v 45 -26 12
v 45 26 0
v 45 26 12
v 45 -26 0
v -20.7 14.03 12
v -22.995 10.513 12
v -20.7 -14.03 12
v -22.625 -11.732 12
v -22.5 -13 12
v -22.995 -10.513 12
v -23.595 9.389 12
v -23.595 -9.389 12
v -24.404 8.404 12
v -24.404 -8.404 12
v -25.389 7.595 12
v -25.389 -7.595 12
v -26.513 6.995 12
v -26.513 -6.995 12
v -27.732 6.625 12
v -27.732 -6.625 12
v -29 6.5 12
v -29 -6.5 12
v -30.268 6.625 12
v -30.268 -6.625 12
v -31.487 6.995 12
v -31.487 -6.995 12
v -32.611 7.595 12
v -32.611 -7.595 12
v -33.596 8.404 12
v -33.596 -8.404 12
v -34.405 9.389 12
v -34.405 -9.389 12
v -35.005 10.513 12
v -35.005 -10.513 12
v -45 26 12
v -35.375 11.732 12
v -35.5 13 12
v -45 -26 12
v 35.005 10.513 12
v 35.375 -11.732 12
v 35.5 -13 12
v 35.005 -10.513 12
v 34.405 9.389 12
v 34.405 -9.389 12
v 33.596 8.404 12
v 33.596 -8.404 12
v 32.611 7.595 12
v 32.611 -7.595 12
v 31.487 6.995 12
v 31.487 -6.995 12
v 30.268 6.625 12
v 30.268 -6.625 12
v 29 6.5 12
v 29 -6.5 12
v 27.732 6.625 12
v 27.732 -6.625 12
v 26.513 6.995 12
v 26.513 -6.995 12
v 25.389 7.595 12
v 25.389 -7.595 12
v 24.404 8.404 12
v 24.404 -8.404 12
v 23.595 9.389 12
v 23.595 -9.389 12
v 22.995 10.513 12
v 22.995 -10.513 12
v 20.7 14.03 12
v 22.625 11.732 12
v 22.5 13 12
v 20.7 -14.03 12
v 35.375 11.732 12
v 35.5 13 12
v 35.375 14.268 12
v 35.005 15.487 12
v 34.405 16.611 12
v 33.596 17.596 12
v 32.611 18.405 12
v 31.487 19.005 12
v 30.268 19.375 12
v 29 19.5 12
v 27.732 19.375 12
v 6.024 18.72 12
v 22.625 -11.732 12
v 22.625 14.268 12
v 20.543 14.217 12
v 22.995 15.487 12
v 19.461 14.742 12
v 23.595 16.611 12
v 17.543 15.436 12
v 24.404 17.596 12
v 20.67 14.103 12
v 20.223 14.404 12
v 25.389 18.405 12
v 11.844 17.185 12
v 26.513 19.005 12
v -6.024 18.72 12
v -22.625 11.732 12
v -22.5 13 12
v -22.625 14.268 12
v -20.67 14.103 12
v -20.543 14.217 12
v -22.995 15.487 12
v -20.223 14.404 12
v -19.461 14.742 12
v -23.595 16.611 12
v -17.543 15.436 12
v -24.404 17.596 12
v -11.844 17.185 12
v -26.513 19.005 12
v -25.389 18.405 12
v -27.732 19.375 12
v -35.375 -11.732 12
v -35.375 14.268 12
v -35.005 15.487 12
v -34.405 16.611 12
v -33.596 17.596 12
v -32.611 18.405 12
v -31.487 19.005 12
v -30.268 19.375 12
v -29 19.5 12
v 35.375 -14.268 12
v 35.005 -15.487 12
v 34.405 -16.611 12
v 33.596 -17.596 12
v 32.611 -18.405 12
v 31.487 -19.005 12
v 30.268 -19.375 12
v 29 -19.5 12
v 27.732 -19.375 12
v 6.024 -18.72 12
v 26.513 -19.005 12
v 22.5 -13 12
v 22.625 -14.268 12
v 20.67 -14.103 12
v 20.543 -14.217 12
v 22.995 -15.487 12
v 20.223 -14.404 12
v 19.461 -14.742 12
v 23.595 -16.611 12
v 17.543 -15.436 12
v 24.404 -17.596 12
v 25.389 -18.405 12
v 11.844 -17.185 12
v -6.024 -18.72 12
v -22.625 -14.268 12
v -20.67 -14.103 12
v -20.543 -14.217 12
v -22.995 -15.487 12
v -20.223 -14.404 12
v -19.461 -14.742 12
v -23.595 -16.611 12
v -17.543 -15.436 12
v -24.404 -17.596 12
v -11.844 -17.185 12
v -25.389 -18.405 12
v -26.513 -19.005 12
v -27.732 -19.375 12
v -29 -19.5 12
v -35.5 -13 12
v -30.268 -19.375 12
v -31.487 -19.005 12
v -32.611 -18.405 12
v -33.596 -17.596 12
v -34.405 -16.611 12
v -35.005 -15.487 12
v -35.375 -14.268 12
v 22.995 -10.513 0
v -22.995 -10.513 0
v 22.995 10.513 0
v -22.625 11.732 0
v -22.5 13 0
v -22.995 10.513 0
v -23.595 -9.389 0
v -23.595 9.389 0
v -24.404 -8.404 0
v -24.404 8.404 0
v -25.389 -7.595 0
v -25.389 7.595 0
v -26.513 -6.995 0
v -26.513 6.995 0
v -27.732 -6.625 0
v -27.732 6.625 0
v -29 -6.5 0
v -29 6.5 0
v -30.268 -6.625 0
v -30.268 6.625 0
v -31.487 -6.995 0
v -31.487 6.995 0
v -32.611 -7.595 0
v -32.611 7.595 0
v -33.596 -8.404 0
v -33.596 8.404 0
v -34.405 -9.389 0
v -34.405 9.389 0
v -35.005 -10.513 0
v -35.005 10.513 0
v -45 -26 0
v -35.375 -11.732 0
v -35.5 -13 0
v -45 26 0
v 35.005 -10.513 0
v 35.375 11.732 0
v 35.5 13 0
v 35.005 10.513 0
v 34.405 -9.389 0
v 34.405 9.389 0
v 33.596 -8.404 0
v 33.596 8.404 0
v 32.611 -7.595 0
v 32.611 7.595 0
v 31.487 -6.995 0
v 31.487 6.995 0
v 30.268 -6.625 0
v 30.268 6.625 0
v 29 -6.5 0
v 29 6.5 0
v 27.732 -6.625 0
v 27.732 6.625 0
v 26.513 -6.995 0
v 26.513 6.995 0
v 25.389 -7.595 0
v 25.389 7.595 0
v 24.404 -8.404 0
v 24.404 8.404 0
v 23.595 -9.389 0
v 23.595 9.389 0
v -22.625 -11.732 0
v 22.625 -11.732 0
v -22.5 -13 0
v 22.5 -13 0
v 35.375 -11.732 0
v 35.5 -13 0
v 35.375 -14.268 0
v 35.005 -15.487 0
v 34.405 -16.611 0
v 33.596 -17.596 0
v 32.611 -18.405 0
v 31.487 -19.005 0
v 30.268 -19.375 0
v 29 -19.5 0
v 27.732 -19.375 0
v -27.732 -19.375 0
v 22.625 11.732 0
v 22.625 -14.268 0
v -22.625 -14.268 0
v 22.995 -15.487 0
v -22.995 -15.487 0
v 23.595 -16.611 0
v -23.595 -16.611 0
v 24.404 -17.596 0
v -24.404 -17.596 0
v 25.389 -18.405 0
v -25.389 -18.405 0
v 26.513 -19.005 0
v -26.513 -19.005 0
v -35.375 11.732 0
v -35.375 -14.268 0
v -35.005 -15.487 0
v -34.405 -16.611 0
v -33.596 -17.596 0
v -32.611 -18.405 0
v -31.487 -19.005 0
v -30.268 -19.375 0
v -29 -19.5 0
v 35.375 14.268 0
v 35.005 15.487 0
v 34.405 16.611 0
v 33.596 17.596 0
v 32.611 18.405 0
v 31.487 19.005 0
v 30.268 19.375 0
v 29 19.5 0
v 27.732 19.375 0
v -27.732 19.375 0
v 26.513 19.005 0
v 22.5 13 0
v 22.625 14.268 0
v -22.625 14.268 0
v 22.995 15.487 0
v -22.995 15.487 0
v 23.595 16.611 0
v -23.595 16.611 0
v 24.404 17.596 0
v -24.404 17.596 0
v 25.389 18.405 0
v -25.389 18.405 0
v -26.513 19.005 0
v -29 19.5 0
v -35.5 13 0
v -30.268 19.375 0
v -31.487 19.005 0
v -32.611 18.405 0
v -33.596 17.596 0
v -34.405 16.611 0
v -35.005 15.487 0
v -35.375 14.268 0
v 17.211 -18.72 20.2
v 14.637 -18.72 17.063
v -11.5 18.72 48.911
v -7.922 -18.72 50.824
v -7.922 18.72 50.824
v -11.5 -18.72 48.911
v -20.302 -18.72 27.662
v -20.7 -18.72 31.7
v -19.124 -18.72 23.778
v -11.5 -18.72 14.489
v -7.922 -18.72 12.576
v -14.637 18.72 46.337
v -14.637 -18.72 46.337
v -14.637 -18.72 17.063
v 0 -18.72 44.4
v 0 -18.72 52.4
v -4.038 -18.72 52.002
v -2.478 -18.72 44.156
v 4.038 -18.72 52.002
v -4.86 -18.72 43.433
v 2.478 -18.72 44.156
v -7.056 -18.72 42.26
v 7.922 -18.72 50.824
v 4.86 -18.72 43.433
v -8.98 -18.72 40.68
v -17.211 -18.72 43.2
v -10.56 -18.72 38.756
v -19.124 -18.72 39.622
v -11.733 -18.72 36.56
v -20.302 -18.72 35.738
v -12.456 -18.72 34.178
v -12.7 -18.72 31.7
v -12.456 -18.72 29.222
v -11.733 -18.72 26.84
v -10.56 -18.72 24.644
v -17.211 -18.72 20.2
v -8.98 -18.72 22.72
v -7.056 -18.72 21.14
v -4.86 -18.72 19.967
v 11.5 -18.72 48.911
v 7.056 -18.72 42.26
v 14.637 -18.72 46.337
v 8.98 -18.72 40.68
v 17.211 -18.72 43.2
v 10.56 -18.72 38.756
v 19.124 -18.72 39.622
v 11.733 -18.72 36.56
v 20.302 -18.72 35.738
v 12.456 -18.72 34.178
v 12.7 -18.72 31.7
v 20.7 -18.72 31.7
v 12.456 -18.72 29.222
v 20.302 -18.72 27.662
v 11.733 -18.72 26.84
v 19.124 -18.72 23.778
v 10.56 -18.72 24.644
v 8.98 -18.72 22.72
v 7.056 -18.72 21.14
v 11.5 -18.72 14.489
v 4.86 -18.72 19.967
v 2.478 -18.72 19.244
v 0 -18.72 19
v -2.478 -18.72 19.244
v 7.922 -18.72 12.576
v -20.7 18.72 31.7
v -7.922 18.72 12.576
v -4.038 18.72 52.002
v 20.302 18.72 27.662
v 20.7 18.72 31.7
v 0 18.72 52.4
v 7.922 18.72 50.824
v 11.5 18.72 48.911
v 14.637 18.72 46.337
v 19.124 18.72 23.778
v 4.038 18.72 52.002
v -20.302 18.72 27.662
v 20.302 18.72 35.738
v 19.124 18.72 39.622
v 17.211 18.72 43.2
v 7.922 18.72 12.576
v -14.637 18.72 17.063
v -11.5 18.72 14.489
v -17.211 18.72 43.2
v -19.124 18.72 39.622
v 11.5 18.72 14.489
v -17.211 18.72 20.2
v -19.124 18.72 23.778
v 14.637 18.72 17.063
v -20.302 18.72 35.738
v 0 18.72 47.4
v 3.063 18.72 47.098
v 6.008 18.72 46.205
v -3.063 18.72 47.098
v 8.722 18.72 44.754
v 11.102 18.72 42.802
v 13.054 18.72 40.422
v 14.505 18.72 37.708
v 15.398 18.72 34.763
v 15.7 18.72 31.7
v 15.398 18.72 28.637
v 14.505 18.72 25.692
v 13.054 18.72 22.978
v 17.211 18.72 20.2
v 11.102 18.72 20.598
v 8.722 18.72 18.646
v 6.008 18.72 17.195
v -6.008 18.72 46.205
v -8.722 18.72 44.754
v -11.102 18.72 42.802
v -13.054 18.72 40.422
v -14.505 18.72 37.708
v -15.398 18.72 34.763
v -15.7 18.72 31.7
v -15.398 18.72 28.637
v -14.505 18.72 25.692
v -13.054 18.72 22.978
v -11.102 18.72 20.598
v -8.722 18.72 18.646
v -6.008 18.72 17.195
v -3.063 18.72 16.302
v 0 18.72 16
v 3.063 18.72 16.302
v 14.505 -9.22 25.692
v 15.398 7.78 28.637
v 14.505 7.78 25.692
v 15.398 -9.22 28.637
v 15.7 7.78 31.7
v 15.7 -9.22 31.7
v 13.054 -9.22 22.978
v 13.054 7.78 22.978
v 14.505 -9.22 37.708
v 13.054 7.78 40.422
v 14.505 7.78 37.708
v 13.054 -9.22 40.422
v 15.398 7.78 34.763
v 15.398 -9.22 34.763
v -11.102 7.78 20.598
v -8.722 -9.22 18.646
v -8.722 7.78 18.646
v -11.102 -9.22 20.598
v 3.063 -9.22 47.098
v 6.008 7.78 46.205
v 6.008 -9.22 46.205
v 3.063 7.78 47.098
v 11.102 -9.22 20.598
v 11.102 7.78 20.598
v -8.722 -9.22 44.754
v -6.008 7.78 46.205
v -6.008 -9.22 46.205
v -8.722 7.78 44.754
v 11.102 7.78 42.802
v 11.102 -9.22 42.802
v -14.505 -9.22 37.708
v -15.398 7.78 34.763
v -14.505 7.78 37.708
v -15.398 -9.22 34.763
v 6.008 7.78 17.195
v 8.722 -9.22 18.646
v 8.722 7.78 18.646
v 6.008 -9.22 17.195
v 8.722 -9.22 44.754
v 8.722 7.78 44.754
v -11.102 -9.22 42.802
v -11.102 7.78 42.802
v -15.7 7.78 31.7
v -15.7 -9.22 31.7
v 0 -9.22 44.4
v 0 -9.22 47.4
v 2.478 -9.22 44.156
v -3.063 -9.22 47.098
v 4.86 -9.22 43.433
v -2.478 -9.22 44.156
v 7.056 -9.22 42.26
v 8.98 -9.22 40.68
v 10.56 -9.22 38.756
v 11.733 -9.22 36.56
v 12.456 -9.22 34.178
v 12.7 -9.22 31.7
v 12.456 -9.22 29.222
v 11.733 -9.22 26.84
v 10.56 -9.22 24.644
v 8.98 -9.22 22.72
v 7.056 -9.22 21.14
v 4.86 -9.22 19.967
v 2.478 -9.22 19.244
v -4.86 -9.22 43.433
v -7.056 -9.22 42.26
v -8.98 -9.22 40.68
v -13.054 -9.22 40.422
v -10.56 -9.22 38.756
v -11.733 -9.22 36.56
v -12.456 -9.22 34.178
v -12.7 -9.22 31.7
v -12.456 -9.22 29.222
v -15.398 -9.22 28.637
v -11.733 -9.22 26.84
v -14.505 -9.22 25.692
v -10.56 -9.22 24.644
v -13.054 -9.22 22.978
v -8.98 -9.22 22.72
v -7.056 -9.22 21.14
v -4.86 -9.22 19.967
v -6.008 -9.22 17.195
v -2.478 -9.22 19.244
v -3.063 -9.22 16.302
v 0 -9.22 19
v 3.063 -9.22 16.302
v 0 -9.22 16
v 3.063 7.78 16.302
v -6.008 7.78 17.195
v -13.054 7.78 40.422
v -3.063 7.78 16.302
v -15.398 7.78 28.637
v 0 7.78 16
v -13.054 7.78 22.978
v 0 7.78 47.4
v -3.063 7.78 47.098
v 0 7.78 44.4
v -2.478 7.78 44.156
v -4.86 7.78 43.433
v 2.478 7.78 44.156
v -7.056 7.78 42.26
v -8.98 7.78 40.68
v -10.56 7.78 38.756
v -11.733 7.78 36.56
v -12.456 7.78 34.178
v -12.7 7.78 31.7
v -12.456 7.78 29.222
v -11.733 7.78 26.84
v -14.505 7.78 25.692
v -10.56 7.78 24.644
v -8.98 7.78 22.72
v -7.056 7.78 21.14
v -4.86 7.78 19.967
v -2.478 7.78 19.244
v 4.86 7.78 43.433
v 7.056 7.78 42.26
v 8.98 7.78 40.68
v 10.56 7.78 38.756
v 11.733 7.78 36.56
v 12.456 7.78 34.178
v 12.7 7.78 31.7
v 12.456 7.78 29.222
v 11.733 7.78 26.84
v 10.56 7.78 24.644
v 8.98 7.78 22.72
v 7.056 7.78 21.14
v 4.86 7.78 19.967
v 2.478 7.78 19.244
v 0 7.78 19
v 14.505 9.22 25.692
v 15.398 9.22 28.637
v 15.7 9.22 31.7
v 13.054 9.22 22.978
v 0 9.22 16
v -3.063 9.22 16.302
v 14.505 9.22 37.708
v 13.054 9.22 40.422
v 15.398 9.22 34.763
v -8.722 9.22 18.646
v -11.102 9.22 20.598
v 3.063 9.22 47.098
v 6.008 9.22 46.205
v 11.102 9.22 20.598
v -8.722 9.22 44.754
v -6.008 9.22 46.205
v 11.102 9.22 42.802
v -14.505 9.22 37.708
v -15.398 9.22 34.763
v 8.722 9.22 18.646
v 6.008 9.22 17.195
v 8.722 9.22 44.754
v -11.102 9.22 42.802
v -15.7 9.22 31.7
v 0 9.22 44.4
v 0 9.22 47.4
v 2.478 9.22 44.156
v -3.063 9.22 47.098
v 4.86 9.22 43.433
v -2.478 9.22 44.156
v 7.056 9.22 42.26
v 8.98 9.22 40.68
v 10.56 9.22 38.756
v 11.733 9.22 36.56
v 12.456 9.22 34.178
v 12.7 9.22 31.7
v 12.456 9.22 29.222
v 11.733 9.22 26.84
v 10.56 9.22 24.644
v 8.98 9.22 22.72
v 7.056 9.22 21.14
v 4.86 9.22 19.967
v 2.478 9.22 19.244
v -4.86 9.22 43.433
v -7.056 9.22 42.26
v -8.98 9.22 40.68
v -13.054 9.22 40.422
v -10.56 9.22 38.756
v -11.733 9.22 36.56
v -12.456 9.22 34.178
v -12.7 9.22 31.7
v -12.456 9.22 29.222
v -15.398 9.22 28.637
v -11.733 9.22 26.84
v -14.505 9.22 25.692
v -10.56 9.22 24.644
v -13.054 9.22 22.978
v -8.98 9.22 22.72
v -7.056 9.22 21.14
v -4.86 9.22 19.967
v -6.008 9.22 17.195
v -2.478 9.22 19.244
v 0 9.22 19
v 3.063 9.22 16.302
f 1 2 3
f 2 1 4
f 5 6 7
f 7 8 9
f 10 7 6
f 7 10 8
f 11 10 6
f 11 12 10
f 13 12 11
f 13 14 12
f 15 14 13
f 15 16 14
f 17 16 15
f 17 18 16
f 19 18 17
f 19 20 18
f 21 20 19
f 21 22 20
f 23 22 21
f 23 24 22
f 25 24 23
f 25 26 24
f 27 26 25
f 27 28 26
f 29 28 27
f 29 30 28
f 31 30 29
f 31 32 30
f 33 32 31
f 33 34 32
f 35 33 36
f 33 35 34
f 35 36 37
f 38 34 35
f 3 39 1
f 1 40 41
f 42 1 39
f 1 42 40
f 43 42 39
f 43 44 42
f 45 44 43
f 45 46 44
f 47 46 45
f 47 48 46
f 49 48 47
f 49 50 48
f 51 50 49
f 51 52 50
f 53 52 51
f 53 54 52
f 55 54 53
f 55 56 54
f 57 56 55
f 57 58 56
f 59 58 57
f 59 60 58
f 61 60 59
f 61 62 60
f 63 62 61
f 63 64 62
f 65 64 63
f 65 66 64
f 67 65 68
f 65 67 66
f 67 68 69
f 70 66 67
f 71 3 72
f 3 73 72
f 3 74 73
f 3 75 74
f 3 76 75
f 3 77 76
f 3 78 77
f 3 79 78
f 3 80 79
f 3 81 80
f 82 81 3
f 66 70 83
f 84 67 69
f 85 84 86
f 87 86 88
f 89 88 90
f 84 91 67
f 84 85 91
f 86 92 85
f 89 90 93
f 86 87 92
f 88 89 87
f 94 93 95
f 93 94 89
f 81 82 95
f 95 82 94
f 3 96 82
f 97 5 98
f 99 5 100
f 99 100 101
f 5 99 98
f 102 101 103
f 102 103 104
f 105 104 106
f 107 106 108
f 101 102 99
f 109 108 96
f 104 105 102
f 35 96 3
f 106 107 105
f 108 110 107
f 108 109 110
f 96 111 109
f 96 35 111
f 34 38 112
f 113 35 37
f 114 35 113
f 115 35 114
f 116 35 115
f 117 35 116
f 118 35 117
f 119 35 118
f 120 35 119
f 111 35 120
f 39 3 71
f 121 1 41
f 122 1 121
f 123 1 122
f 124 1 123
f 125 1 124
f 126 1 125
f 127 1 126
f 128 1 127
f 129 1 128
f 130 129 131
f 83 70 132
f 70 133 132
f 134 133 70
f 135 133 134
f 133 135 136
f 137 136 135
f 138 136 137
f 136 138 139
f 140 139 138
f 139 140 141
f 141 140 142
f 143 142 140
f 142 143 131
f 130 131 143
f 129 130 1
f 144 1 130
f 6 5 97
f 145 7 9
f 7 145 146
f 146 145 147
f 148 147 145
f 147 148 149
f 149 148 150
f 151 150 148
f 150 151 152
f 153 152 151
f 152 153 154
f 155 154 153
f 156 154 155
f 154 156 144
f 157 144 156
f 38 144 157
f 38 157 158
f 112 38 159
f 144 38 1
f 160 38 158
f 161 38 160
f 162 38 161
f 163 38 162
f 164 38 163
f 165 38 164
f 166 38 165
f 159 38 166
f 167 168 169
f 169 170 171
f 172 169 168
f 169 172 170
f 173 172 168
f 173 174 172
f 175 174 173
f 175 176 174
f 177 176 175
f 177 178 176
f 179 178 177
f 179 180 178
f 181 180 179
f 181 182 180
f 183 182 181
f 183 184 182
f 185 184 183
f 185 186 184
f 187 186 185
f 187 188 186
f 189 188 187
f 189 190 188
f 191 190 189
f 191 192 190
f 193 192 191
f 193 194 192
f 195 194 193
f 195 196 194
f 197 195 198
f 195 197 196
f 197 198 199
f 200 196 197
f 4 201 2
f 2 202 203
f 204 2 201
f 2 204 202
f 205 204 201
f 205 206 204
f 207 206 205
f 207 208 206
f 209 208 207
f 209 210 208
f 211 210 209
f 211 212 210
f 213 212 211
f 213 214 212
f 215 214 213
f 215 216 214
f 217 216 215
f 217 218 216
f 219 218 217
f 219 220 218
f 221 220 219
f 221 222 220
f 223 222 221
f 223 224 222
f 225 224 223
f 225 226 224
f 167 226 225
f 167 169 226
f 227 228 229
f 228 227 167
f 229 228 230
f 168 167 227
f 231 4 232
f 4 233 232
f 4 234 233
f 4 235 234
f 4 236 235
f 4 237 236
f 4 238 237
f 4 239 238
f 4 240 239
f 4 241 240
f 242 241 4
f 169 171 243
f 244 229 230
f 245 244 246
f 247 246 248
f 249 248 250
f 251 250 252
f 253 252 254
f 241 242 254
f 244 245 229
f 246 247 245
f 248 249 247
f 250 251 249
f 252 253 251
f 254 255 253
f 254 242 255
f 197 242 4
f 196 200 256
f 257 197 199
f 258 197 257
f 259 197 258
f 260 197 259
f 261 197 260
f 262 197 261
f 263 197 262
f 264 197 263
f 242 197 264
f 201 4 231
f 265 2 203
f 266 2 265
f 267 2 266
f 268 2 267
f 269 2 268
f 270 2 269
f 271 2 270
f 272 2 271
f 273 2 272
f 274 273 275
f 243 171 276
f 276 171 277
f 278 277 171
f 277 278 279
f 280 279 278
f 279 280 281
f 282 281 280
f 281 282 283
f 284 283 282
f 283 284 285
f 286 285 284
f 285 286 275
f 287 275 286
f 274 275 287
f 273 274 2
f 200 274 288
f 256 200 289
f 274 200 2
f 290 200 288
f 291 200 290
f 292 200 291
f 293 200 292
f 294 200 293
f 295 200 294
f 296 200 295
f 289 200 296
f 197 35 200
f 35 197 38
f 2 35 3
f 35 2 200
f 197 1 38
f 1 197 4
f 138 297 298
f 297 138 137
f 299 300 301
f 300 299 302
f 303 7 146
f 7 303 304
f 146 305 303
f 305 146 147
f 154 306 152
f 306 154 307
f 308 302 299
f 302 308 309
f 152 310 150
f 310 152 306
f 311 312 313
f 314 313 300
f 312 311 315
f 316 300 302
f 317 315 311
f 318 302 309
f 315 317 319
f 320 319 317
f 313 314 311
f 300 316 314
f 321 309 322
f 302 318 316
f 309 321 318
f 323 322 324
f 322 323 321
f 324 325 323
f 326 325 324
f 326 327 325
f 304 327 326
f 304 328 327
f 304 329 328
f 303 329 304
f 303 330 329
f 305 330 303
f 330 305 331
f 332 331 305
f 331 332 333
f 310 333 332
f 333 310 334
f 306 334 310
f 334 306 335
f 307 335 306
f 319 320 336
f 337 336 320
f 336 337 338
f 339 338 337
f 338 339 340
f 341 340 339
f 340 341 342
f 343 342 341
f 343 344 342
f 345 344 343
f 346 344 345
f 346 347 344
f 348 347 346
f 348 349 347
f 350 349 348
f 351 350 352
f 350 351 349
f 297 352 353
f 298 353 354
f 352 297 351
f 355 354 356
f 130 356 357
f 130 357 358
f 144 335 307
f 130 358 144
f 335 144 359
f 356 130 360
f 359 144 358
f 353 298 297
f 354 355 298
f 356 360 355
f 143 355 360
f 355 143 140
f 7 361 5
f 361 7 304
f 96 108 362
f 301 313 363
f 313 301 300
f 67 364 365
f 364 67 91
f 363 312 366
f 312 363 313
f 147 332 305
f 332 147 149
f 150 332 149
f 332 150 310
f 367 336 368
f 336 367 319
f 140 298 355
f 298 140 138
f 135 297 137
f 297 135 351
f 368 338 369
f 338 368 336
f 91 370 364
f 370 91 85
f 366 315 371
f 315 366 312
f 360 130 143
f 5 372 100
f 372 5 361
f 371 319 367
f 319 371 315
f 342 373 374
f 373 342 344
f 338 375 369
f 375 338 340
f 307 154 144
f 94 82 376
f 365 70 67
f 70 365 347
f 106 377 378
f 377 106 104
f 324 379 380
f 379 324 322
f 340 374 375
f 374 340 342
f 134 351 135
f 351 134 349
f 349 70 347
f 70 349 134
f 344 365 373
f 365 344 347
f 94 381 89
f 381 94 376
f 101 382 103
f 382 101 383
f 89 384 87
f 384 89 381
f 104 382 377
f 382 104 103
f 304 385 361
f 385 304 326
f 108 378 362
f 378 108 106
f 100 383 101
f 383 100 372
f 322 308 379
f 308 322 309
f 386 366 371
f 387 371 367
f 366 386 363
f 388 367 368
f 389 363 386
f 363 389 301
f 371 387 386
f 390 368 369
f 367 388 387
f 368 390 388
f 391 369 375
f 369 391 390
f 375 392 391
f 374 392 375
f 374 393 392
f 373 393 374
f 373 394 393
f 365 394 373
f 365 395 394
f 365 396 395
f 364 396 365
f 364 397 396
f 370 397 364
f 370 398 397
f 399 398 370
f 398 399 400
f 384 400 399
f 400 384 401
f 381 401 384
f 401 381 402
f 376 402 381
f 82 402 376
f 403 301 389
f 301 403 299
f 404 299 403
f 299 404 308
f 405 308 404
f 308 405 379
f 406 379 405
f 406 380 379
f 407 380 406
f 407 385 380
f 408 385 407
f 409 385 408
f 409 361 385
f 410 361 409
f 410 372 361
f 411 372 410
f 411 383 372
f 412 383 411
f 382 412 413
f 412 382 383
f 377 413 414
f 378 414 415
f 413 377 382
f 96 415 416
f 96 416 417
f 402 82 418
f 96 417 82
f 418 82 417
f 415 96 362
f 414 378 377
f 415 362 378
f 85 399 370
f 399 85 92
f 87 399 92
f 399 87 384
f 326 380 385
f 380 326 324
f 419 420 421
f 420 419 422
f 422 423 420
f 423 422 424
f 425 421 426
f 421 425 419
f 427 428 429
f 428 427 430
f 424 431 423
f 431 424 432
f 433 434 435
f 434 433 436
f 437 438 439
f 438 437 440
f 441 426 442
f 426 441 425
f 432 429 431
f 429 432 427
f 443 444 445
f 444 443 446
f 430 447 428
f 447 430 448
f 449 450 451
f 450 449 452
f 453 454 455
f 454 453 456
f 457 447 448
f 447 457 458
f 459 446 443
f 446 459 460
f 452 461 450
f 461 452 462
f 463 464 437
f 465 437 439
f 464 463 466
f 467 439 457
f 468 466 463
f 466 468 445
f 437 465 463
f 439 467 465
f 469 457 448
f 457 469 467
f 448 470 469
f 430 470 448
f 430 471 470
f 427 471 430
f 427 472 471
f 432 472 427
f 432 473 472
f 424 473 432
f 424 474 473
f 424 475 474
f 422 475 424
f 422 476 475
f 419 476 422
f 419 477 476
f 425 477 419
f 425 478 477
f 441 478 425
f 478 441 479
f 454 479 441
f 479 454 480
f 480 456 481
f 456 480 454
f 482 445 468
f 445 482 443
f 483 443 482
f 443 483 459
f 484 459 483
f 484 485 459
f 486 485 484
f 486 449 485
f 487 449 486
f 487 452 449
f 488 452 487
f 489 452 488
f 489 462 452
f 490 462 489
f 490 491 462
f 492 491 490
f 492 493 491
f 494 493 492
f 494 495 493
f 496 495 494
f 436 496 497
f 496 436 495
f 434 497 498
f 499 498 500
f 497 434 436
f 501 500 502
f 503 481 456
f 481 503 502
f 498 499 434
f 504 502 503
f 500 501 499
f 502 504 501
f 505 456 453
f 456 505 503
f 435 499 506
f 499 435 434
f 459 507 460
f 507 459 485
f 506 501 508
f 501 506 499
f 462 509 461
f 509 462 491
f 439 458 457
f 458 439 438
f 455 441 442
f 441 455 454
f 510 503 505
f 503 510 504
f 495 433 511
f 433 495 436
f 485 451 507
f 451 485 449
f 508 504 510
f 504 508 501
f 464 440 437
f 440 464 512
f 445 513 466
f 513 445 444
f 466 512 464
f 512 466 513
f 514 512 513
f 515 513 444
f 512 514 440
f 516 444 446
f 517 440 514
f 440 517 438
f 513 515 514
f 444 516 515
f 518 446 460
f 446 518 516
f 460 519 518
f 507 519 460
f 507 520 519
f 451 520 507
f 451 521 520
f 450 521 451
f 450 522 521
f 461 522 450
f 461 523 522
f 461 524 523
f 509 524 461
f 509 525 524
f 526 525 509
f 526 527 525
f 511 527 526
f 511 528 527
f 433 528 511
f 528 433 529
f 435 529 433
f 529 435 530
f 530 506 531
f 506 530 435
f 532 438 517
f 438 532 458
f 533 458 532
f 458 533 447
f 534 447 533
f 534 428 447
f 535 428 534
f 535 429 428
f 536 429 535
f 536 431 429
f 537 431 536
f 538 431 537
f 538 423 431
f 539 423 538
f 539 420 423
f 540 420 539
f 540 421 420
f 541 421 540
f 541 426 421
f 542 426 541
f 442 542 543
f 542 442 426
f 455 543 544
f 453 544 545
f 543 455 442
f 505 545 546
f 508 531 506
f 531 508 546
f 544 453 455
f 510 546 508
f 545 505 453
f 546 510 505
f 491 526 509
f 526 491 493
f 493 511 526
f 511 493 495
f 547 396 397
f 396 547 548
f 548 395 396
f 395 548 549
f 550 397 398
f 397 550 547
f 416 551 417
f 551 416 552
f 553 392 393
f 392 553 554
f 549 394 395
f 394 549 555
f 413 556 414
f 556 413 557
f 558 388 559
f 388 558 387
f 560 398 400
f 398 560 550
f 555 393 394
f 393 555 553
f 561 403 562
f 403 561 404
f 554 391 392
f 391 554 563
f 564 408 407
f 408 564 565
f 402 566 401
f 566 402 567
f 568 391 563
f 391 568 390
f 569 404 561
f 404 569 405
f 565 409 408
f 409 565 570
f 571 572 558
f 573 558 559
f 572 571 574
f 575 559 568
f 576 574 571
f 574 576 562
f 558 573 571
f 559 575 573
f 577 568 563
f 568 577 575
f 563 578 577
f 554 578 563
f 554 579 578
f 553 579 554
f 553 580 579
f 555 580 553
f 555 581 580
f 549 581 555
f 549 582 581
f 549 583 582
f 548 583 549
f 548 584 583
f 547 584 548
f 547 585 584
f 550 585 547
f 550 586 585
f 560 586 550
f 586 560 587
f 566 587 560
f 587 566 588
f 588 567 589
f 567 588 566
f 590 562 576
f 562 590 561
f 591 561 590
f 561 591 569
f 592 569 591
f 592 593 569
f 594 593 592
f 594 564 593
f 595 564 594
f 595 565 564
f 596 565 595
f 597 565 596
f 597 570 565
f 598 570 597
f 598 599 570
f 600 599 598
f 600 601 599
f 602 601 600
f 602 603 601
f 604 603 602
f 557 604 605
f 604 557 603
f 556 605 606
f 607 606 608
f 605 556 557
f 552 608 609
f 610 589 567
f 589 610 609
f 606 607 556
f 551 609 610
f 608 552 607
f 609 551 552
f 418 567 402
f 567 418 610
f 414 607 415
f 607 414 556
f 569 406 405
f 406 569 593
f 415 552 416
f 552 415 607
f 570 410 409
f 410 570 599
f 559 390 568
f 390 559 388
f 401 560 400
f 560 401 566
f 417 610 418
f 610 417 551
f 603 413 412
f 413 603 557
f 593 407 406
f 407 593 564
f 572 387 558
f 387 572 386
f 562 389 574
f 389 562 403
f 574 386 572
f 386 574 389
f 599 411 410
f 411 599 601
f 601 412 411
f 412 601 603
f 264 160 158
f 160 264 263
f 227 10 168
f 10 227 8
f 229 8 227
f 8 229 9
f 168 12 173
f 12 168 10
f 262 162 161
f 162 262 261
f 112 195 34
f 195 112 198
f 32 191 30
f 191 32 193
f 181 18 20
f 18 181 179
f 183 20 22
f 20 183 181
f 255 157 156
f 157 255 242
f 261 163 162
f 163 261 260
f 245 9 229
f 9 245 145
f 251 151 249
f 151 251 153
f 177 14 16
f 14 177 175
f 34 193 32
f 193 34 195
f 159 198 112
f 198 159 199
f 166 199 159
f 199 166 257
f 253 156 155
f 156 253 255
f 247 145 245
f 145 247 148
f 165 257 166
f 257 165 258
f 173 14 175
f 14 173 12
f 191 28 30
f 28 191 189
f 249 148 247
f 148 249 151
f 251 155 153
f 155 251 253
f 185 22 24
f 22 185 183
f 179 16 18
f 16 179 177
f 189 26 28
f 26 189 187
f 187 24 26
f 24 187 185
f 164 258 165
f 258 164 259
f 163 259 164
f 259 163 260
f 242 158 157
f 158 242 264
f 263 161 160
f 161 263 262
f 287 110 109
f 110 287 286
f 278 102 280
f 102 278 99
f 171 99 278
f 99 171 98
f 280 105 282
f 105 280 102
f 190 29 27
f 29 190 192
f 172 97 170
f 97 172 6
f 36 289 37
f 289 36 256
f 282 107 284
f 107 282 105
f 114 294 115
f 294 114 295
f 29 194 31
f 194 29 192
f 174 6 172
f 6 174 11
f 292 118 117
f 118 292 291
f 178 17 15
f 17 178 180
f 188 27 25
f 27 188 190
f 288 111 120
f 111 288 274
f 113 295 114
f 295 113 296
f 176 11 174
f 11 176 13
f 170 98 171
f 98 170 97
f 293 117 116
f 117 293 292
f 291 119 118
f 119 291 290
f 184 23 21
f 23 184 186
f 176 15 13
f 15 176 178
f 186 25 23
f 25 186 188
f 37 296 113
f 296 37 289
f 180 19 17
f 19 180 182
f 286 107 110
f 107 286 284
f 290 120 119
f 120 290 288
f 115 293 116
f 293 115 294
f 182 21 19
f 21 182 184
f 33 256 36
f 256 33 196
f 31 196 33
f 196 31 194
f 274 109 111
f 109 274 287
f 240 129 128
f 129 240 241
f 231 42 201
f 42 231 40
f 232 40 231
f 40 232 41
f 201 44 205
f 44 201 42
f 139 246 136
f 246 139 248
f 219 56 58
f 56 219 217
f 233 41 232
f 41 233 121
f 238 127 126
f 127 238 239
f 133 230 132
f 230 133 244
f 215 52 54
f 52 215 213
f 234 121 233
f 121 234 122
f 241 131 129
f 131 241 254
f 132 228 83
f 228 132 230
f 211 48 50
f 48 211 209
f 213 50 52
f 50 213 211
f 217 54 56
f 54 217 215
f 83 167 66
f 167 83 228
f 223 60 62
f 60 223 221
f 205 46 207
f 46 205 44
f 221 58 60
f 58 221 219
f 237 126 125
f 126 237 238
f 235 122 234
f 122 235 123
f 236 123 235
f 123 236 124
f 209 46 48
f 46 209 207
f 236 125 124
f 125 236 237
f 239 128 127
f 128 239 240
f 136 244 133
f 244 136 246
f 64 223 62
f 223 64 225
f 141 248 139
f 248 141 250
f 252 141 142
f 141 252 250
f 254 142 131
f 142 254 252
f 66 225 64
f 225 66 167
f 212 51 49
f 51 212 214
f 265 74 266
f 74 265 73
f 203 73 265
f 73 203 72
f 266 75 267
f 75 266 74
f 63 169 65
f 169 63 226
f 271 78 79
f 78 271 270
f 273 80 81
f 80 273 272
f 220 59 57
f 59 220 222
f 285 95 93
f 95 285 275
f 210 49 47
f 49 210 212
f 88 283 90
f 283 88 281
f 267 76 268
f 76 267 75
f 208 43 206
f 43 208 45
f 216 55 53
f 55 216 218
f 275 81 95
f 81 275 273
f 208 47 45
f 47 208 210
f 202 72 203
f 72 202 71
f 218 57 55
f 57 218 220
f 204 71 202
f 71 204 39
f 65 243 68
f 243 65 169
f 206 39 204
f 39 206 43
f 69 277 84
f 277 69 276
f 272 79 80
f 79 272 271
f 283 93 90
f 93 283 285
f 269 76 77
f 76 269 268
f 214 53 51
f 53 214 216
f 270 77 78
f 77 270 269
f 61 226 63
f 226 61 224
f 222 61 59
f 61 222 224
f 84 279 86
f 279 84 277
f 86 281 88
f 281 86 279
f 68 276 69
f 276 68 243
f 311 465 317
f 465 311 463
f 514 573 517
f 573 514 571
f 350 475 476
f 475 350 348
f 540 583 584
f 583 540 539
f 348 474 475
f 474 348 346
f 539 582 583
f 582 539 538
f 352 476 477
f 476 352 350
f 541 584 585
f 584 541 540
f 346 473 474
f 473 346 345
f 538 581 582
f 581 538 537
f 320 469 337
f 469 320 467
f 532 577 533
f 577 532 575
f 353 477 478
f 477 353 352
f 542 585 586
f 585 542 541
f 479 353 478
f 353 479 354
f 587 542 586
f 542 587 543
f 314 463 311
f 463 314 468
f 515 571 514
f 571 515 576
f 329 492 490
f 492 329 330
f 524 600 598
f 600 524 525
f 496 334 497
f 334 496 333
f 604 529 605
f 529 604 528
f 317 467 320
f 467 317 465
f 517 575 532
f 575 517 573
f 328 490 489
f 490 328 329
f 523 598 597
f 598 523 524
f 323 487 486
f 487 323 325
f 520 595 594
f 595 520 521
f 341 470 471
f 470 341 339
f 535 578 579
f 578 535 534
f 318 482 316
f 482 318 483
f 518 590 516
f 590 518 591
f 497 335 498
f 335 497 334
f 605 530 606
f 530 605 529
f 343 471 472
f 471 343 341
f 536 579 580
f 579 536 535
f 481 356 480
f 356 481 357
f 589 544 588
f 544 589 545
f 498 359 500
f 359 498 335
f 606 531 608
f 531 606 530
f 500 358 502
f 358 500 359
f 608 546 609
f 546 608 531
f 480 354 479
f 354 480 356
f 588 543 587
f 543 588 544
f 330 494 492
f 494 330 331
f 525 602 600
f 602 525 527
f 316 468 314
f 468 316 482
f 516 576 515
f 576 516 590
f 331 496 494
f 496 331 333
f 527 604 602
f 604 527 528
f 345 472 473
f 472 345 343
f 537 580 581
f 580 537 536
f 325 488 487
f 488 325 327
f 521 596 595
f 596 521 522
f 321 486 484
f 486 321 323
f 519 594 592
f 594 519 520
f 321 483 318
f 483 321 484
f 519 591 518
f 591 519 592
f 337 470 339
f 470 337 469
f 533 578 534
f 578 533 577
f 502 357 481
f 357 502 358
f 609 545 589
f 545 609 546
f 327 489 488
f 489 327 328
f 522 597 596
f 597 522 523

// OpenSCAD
$fn = 32;

// ----------------------------------------------------------------------
// Bearing block: 90 x 52 mm base, 25.4 mm bore at 31.7 mm
// ----------------------------------------------------------------------

// --- parameters (mm) ---
base_w = 90;              // base width
base_d = 52;              // base depth
base_t = 12;              // base thickness
bore_d = 25.4;            // shaft / bearing bore
house_r = 20.7;           // housing outer radius
house_len = 37.44;        // housing length along the shaft
foot_w = 41.4;            // foot width under the housing
foot_len = 27.44;         // foot length along the shaft
axis_z = 31.7;            // bore axis height above the base
holes_d = 13;             // mounting holes
hole_x = 29;              // mounting hole spacing
seat_d = 12;              // bearing seat depth
seat_wall = 3;            // seat wall thickness

difference() {
  union() {
    /* base plate with its underside on z = 0 */
    translate([0, 0, base_t / 2]) cube([base_w, base_d, base_t], center = true);
    /* hull foot: a straight web blending into the round housing */
    hull() {
      translate([0, 0, base_t - 0.5]) cube([foot_w, foot_len, 1.6], center = true);
      translate([0, 0, axis_z]) rotate([-90, 0, 0]) cylinder(h = house_len, d = 2 * house_r, center = true);
    }
  }
  /* bore through the housing, 2.5 mm clear on both sides */
  translate([0, 0, axis_z]) rotate([-90, 0, 0]) cylinder(h = house_len + 5, d = bore_d, center = true);
  /* bearing seats, recessed into both ends of the housing */
  for (sy = [-1, 1]) {
    translate([0, sy * (house_len / 2 - seat_d + 2.5), axis_z]) rotate([-90, 0, 0]) cylinder(h = seat_d + 5, d = bore_d + 2 * seat_wall);
  }
  /* mounting holes through the base plate */
  for (hx = [-29, 29]) {
    for (hy = [-13, 13]) {
      translate([hx, hy, -2.5]) cylinder(h = base_t + 5, d = holes_d);
    }
  }
}
